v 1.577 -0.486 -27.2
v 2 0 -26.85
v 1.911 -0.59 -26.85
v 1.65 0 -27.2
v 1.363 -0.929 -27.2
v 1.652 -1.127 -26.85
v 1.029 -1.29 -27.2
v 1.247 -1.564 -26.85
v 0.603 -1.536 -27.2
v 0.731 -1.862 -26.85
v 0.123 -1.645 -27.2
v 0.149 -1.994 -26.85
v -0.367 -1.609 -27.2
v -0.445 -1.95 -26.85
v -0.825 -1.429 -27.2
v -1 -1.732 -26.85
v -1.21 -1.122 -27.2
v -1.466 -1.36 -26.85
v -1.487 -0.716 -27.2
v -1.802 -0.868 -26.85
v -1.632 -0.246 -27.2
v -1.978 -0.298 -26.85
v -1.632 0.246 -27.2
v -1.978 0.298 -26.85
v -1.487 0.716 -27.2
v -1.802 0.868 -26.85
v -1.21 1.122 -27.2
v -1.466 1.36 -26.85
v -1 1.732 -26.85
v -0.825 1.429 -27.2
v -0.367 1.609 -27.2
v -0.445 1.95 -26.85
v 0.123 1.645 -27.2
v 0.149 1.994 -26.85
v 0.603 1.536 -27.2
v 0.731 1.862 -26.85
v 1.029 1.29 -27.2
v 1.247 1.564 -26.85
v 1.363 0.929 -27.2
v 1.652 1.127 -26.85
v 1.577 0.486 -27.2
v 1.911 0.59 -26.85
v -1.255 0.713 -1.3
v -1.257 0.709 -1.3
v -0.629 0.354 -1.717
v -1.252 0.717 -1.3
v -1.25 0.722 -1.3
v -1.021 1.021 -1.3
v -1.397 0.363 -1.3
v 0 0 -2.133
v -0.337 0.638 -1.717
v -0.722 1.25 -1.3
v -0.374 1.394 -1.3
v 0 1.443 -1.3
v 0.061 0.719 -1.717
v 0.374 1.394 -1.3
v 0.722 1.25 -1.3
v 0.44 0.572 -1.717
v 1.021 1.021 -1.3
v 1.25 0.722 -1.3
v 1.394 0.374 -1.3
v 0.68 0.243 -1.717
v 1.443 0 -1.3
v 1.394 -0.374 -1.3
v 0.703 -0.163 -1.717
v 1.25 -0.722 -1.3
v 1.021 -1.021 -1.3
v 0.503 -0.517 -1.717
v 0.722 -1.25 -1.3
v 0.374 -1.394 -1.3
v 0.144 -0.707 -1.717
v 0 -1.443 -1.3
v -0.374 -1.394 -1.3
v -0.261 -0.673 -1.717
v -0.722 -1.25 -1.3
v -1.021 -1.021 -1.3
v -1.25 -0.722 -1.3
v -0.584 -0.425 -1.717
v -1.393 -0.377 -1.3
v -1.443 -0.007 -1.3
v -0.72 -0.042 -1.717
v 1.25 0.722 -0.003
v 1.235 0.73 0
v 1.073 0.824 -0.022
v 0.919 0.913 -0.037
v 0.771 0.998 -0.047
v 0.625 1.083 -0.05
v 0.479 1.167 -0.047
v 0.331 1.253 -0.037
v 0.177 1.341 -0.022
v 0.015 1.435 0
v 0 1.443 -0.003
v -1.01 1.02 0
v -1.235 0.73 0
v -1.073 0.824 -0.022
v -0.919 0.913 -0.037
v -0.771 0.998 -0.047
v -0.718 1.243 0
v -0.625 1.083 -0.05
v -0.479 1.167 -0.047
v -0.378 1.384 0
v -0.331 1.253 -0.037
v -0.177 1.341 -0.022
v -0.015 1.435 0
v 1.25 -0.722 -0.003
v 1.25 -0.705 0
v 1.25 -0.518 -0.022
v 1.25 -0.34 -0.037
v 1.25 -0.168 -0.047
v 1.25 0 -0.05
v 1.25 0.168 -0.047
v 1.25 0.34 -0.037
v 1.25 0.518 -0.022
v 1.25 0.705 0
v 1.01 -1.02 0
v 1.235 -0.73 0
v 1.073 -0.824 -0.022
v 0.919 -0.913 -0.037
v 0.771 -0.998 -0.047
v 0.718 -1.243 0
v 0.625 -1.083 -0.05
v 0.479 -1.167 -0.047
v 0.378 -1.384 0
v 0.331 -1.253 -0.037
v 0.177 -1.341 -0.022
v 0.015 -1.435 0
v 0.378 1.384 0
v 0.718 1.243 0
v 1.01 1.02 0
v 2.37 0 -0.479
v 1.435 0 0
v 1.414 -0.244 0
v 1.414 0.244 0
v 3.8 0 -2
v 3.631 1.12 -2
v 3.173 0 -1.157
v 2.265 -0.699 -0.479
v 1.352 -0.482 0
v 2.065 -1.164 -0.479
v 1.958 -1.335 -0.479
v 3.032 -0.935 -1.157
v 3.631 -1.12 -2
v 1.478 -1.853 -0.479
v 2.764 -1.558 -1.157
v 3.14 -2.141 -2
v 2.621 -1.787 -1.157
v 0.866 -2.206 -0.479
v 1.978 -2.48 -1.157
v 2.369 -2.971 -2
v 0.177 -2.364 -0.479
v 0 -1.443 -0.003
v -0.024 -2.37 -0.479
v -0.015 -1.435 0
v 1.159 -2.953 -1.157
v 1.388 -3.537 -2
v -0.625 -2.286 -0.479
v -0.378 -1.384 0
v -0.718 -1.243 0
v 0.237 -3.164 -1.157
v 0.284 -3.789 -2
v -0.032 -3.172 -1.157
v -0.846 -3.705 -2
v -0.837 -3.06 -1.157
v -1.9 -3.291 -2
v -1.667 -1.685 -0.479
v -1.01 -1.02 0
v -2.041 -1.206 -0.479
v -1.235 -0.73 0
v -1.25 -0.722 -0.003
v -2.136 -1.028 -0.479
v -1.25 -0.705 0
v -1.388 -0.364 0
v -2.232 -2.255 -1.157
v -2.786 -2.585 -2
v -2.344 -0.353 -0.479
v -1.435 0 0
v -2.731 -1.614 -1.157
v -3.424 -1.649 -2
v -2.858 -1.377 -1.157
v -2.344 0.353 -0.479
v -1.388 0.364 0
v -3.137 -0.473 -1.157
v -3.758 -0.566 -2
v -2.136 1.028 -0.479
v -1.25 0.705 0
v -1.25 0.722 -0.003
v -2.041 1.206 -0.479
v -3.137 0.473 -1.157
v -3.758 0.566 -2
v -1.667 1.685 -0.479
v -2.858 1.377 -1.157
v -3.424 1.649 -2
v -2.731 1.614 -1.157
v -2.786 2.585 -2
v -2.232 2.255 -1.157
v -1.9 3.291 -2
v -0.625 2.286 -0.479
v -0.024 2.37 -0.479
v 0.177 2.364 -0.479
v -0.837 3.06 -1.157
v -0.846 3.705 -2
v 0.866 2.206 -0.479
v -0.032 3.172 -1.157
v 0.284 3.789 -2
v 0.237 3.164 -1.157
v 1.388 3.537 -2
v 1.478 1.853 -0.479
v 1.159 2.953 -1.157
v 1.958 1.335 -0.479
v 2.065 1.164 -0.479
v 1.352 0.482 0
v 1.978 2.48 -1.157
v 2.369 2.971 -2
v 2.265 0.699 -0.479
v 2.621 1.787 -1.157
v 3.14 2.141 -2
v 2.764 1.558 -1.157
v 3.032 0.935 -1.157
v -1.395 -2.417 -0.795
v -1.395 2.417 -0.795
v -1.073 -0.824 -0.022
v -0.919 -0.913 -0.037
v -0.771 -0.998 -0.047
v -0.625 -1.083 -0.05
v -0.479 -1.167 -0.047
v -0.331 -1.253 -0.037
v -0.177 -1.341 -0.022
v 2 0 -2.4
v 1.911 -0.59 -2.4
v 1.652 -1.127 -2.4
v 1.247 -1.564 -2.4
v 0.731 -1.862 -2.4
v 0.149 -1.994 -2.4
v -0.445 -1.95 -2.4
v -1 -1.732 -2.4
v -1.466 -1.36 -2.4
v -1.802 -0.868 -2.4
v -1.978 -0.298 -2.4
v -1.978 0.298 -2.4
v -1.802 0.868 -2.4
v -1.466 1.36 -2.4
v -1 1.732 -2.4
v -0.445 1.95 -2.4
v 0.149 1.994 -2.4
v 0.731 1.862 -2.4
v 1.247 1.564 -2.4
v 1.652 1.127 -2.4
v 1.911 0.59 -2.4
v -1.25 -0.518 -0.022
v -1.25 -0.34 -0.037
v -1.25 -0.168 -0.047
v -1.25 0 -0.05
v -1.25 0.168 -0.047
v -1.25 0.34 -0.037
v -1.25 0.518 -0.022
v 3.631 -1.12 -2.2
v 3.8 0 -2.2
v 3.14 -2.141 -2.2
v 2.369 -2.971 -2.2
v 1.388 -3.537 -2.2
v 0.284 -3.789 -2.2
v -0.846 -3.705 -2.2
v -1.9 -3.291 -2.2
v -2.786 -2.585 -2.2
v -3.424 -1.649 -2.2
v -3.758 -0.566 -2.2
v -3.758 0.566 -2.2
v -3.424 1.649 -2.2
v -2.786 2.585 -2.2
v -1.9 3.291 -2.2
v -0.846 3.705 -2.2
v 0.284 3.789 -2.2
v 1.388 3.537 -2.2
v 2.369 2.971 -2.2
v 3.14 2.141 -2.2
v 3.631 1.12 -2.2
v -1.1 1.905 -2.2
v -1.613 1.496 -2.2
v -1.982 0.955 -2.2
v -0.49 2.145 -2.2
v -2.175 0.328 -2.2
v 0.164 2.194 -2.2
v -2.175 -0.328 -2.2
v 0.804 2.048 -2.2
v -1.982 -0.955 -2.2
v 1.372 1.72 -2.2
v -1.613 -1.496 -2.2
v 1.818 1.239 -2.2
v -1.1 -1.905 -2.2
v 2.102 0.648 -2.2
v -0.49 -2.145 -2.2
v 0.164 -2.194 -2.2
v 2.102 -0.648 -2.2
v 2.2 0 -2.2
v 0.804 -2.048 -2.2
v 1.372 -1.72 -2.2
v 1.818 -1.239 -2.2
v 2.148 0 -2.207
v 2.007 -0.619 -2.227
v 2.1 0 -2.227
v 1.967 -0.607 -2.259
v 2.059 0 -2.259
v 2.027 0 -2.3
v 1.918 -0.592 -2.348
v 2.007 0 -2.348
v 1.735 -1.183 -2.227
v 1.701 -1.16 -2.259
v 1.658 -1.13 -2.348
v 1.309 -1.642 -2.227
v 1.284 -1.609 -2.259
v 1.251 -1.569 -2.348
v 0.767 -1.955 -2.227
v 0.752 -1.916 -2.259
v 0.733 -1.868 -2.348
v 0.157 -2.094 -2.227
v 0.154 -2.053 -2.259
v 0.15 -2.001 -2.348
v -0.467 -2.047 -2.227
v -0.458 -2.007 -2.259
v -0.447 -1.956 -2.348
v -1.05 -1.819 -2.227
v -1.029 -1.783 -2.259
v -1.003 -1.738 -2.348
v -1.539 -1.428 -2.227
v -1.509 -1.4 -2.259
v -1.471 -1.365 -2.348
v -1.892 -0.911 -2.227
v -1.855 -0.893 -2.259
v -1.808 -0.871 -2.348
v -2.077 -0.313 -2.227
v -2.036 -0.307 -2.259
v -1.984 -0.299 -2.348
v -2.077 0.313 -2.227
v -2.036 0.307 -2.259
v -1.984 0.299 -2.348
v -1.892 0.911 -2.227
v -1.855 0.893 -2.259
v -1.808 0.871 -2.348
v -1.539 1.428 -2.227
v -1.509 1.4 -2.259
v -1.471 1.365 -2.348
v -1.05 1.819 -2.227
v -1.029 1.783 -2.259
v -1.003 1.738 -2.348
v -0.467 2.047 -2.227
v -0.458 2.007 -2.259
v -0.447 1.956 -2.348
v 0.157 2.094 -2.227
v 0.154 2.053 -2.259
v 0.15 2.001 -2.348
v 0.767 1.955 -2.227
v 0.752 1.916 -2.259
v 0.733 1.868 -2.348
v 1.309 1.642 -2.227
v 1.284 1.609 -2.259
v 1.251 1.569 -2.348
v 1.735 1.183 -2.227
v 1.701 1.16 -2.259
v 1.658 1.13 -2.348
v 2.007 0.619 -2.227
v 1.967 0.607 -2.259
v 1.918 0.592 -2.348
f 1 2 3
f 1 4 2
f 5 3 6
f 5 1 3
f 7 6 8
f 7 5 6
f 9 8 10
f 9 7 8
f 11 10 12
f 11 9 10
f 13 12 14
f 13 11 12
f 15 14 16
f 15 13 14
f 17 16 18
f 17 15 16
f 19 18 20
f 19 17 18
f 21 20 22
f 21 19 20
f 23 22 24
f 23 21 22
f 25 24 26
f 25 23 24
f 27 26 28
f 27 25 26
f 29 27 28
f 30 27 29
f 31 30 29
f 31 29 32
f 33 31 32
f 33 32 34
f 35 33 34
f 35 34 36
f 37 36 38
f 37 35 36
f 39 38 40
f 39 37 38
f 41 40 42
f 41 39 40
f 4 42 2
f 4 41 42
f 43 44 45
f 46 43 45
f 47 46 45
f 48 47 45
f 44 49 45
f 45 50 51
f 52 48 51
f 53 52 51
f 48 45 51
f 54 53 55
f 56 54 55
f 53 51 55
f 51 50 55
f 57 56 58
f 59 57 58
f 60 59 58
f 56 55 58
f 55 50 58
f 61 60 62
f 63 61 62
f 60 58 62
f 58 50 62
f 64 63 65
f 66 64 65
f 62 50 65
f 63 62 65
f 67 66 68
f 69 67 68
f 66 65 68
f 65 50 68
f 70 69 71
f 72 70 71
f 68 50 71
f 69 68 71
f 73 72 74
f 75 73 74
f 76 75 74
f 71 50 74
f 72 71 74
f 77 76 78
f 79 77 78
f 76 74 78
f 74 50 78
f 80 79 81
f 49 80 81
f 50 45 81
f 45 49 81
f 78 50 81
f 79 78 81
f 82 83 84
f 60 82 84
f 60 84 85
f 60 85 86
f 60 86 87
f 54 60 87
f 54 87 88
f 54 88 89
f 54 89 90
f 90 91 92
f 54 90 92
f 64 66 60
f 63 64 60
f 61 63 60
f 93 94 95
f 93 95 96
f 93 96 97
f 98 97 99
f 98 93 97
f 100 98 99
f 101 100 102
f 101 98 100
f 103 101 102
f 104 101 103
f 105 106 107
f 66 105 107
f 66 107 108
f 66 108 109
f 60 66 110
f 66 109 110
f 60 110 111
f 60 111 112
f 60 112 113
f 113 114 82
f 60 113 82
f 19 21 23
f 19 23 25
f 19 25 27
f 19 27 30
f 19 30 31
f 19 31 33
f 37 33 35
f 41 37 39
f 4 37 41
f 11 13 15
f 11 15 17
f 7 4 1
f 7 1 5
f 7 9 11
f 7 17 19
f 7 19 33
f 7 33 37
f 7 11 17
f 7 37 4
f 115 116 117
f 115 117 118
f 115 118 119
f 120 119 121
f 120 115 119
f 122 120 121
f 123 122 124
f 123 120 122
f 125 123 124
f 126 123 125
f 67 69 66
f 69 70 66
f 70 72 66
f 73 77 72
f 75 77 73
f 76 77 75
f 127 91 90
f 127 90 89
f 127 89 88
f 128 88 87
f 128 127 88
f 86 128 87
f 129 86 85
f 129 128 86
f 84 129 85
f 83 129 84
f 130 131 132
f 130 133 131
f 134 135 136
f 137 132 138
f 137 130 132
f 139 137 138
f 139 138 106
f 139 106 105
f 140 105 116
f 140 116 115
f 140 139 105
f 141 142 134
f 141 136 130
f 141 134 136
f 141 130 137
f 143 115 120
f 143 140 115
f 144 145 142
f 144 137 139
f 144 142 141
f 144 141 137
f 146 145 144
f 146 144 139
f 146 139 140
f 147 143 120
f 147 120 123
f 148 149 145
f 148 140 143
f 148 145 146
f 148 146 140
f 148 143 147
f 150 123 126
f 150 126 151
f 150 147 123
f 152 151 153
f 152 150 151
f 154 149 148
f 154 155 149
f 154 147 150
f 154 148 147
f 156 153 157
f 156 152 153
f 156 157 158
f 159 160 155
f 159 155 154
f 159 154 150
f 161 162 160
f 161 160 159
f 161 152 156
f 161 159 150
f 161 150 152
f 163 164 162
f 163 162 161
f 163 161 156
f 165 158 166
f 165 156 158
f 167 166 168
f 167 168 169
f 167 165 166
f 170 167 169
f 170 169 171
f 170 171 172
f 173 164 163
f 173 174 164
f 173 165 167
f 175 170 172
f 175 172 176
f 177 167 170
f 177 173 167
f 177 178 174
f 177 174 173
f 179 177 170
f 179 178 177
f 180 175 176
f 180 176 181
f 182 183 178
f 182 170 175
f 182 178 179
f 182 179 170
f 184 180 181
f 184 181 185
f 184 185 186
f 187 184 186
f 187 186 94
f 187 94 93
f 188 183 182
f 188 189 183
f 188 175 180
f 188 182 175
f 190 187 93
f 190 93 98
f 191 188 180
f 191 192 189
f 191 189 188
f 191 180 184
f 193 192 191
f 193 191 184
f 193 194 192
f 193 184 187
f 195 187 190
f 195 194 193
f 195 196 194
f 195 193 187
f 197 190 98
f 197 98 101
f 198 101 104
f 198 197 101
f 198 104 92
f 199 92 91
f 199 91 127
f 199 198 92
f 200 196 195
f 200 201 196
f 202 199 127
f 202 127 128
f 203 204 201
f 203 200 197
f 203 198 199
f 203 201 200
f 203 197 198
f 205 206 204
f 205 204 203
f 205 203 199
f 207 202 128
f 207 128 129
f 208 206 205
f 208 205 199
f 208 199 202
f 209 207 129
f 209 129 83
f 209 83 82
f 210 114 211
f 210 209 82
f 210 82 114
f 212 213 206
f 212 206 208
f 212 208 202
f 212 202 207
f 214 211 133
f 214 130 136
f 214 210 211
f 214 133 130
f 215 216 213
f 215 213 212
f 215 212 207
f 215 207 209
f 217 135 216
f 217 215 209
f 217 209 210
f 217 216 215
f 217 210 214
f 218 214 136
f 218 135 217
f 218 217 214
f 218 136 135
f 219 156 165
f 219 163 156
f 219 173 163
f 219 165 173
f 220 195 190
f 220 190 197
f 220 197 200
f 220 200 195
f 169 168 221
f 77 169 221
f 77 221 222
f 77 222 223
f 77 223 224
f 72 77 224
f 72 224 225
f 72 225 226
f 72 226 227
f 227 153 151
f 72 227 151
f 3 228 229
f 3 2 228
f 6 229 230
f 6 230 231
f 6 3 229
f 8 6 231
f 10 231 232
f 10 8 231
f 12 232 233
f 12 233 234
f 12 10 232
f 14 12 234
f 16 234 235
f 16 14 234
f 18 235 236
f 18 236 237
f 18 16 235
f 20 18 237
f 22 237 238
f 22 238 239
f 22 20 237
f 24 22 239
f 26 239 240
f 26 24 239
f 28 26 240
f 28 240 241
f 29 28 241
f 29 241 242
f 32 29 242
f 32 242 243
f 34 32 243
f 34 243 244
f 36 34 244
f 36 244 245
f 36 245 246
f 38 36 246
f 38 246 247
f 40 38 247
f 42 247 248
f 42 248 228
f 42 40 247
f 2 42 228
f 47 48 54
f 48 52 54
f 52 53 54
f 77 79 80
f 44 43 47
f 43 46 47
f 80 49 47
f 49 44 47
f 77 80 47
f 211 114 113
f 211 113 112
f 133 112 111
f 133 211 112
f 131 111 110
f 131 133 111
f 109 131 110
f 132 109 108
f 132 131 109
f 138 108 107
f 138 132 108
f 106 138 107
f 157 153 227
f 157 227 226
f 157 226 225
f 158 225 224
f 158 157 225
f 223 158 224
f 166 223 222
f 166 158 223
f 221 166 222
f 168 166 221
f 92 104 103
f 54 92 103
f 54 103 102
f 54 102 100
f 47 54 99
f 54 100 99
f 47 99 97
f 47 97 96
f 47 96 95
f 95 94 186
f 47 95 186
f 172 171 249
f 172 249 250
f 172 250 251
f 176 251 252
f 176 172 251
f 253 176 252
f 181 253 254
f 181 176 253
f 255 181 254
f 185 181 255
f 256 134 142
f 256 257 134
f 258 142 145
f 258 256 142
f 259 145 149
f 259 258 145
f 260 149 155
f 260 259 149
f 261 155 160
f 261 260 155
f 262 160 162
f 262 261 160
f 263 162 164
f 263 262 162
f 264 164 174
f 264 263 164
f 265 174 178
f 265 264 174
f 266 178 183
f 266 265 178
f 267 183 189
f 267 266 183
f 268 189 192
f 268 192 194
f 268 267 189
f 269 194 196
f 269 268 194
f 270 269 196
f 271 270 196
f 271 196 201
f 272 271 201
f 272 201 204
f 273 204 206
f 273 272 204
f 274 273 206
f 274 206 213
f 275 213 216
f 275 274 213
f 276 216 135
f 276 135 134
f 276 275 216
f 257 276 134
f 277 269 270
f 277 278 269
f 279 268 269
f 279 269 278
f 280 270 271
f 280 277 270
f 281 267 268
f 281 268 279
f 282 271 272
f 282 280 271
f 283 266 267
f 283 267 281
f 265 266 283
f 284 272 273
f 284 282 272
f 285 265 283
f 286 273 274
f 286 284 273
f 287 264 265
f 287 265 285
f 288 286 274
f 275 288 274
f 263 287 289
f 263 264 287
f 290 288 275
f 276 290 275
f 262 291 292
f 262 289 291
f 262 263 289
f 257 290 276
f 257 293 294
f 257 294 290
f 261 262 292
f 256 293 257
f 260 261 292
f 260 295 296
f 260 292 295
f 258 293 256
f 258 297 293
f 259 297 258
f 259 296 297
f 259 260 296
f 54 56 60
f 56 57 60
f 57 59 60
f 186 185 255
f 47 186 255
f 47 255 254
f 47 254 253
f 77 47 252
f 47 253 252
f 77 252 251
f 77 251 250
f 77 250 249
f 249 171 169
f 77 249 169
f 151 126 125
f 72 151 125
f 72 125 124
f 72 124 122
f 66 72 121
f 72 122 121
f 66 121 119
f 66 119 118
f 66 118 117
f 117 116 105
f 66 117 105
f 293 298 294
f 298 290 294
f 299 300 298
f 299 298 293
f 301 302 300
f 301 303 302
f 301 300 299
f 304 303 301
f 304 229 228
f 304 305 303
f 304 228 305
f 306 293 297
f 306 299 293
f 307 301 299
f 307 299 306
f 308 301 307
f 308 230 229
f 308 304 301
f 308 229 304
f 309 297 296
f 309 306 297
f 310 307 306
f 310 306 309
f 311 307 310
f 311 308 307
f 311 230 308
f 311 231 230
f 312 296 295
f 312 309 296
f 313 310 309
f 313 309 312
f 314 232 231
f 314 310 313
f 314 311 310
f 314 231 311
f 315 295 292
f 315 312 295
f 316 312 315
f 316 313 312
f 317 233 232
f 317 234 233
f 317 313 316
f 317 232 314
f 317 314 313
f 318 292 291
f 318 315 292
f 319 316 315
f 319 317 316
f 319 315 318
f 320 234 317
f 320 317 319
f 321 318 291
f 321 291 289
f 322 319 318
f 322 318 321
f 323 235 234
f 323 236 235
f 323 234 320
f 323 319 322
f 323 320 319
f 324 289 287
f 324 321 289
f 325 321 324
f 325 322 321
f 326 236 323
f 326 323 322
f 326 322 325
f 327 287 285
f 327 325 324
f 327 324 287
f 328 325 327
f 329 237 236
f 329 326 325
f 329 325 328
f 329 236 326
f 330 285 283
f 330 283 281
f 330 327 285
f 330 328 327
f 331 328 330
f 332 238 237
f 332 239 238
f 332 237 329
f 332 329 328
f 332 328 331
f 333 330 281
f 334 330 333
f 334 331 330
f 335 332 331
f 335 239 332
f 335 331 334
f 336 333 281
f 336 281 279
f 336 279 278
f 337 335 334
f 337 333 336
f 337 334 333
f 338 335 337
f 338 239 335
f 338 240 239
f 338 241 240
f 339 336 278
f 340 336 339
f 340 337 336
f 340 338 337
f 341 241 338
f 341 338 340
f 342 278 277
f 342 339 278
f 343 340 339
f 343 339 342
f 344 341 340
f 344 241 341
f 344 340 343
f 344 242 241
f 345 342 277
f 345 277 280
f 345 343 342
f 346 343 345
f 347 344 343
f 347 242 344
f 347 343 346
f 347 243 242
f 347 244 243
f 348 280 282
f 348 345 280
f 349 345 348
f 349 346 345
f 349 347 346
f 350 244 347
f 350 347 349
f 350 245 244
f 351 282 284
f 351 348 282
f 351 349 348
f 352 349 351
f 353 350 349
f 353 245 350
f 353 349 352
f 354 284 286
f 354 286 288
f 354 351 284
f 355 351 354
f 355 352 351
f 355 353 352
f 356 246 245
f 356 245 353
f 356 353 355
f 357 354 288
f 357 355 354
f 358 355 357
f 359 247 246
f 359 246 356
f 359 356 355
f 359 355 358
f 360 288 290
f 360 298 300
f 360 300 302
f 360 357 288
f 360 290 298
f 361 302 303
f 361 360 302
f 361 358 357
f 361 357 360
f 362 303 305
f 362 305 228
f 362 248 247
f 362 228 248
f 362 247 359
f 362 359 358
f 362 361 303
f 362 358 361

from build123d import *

# Parameters (mm, degrees)
CUT_EXTRUDE2_DEPTH = 1.3


with BuildPart() as part:
    # Sketch1 → Revolve1 (revolve)
    with BuildSketch(Plane(origin=(0, 0, 0), x_dir=(0, 0, -1), z_dir=(1, 0, 0)), mode=Mode.PRIVATE) as revolve1_sk:
        with BuildLine():
            Line((0, 0), (0, 1.435))
            ThreePointArc((0, 1.435), (0.794963972, 2.79089199), (2, 3.8))
            Line((2, 3.8), (2.2, 3.8))
            Line((2.2, 3.8), (2.2, 2.2))
            ThreePointArc((2.2, 2.2), (2.258578644, 2.058578644), (2.4, 2))
            Line((2.4, 2), (26.85, 2))
            Line((26.85, 2), (27.2, 1.65))
            Line((27.2, 1.65), (27.2, 0))
            Line((27.2, 0), (0, 0))
        make_face()
    revolve(revolve1_sk.sketch.rotate(Axis((0, 0, 0), (0, 0, -1)), 90), axis=Axis((0, 0, 0), (0, 0, -1)))

    # Sketch2 → Cut-Extrude2 (cut)
    with BuildSketch(Plane.XY):
        Polygon((0, -1.443375673), (1.25, -0.721687836), (1.25, 0.721687836), (0, 1.443375673), (-1.25, 0.721687836), (-1.25, -0.721687836), align=None)
    extrude(amount=-CUT_EXTRUDE2_DEPTH, mode=Mode.SUBTRACT)

    # Sketch5 → Cut-Revolve3 (revolve, cut)
    with BuildSketch(Plane(origin=(0, 0, 0), x_dir=(0, 0, -1), z_dir=(1, 0, 0)), mode=Mode.PRIVATE) as cut_revolve3_sk:
        Polygon((0.049570601, -1.25), (0, -1.435), (0, -1.25), align=None)
    revolve(cut_revolve3_sk.sketch.rotate(Axis((0, 0, 0), (0, 0, -1)), 119.415596887), axis=Axis((0, 0, 0), (0, 0, -1)), mode=Mode.SUBTRACT)

    # Sketch4 → Cut-Revolve2 (revolve, cut)
    with BuildSketch(Plane(origin=(0, 0, 0), x_dir=(0, 0, -1), z_dir=(1, 0, 0)), mode=Mode.PRIVATE) as cut_revolve2_sk:
        Polygon((1.3, 0), (1.3, -1.443375673), (2.133333333, 0), align=None)
    revolve(cut_revolve2_sk.sketch.rotate(Axis((0, 0, -1.3), (0, 0, -1)), 119.415596887), axis=Axis((0, 0, -1.3), (0, 0, -1)), mode=Mode.SUBTRACT)


solid = part.part
